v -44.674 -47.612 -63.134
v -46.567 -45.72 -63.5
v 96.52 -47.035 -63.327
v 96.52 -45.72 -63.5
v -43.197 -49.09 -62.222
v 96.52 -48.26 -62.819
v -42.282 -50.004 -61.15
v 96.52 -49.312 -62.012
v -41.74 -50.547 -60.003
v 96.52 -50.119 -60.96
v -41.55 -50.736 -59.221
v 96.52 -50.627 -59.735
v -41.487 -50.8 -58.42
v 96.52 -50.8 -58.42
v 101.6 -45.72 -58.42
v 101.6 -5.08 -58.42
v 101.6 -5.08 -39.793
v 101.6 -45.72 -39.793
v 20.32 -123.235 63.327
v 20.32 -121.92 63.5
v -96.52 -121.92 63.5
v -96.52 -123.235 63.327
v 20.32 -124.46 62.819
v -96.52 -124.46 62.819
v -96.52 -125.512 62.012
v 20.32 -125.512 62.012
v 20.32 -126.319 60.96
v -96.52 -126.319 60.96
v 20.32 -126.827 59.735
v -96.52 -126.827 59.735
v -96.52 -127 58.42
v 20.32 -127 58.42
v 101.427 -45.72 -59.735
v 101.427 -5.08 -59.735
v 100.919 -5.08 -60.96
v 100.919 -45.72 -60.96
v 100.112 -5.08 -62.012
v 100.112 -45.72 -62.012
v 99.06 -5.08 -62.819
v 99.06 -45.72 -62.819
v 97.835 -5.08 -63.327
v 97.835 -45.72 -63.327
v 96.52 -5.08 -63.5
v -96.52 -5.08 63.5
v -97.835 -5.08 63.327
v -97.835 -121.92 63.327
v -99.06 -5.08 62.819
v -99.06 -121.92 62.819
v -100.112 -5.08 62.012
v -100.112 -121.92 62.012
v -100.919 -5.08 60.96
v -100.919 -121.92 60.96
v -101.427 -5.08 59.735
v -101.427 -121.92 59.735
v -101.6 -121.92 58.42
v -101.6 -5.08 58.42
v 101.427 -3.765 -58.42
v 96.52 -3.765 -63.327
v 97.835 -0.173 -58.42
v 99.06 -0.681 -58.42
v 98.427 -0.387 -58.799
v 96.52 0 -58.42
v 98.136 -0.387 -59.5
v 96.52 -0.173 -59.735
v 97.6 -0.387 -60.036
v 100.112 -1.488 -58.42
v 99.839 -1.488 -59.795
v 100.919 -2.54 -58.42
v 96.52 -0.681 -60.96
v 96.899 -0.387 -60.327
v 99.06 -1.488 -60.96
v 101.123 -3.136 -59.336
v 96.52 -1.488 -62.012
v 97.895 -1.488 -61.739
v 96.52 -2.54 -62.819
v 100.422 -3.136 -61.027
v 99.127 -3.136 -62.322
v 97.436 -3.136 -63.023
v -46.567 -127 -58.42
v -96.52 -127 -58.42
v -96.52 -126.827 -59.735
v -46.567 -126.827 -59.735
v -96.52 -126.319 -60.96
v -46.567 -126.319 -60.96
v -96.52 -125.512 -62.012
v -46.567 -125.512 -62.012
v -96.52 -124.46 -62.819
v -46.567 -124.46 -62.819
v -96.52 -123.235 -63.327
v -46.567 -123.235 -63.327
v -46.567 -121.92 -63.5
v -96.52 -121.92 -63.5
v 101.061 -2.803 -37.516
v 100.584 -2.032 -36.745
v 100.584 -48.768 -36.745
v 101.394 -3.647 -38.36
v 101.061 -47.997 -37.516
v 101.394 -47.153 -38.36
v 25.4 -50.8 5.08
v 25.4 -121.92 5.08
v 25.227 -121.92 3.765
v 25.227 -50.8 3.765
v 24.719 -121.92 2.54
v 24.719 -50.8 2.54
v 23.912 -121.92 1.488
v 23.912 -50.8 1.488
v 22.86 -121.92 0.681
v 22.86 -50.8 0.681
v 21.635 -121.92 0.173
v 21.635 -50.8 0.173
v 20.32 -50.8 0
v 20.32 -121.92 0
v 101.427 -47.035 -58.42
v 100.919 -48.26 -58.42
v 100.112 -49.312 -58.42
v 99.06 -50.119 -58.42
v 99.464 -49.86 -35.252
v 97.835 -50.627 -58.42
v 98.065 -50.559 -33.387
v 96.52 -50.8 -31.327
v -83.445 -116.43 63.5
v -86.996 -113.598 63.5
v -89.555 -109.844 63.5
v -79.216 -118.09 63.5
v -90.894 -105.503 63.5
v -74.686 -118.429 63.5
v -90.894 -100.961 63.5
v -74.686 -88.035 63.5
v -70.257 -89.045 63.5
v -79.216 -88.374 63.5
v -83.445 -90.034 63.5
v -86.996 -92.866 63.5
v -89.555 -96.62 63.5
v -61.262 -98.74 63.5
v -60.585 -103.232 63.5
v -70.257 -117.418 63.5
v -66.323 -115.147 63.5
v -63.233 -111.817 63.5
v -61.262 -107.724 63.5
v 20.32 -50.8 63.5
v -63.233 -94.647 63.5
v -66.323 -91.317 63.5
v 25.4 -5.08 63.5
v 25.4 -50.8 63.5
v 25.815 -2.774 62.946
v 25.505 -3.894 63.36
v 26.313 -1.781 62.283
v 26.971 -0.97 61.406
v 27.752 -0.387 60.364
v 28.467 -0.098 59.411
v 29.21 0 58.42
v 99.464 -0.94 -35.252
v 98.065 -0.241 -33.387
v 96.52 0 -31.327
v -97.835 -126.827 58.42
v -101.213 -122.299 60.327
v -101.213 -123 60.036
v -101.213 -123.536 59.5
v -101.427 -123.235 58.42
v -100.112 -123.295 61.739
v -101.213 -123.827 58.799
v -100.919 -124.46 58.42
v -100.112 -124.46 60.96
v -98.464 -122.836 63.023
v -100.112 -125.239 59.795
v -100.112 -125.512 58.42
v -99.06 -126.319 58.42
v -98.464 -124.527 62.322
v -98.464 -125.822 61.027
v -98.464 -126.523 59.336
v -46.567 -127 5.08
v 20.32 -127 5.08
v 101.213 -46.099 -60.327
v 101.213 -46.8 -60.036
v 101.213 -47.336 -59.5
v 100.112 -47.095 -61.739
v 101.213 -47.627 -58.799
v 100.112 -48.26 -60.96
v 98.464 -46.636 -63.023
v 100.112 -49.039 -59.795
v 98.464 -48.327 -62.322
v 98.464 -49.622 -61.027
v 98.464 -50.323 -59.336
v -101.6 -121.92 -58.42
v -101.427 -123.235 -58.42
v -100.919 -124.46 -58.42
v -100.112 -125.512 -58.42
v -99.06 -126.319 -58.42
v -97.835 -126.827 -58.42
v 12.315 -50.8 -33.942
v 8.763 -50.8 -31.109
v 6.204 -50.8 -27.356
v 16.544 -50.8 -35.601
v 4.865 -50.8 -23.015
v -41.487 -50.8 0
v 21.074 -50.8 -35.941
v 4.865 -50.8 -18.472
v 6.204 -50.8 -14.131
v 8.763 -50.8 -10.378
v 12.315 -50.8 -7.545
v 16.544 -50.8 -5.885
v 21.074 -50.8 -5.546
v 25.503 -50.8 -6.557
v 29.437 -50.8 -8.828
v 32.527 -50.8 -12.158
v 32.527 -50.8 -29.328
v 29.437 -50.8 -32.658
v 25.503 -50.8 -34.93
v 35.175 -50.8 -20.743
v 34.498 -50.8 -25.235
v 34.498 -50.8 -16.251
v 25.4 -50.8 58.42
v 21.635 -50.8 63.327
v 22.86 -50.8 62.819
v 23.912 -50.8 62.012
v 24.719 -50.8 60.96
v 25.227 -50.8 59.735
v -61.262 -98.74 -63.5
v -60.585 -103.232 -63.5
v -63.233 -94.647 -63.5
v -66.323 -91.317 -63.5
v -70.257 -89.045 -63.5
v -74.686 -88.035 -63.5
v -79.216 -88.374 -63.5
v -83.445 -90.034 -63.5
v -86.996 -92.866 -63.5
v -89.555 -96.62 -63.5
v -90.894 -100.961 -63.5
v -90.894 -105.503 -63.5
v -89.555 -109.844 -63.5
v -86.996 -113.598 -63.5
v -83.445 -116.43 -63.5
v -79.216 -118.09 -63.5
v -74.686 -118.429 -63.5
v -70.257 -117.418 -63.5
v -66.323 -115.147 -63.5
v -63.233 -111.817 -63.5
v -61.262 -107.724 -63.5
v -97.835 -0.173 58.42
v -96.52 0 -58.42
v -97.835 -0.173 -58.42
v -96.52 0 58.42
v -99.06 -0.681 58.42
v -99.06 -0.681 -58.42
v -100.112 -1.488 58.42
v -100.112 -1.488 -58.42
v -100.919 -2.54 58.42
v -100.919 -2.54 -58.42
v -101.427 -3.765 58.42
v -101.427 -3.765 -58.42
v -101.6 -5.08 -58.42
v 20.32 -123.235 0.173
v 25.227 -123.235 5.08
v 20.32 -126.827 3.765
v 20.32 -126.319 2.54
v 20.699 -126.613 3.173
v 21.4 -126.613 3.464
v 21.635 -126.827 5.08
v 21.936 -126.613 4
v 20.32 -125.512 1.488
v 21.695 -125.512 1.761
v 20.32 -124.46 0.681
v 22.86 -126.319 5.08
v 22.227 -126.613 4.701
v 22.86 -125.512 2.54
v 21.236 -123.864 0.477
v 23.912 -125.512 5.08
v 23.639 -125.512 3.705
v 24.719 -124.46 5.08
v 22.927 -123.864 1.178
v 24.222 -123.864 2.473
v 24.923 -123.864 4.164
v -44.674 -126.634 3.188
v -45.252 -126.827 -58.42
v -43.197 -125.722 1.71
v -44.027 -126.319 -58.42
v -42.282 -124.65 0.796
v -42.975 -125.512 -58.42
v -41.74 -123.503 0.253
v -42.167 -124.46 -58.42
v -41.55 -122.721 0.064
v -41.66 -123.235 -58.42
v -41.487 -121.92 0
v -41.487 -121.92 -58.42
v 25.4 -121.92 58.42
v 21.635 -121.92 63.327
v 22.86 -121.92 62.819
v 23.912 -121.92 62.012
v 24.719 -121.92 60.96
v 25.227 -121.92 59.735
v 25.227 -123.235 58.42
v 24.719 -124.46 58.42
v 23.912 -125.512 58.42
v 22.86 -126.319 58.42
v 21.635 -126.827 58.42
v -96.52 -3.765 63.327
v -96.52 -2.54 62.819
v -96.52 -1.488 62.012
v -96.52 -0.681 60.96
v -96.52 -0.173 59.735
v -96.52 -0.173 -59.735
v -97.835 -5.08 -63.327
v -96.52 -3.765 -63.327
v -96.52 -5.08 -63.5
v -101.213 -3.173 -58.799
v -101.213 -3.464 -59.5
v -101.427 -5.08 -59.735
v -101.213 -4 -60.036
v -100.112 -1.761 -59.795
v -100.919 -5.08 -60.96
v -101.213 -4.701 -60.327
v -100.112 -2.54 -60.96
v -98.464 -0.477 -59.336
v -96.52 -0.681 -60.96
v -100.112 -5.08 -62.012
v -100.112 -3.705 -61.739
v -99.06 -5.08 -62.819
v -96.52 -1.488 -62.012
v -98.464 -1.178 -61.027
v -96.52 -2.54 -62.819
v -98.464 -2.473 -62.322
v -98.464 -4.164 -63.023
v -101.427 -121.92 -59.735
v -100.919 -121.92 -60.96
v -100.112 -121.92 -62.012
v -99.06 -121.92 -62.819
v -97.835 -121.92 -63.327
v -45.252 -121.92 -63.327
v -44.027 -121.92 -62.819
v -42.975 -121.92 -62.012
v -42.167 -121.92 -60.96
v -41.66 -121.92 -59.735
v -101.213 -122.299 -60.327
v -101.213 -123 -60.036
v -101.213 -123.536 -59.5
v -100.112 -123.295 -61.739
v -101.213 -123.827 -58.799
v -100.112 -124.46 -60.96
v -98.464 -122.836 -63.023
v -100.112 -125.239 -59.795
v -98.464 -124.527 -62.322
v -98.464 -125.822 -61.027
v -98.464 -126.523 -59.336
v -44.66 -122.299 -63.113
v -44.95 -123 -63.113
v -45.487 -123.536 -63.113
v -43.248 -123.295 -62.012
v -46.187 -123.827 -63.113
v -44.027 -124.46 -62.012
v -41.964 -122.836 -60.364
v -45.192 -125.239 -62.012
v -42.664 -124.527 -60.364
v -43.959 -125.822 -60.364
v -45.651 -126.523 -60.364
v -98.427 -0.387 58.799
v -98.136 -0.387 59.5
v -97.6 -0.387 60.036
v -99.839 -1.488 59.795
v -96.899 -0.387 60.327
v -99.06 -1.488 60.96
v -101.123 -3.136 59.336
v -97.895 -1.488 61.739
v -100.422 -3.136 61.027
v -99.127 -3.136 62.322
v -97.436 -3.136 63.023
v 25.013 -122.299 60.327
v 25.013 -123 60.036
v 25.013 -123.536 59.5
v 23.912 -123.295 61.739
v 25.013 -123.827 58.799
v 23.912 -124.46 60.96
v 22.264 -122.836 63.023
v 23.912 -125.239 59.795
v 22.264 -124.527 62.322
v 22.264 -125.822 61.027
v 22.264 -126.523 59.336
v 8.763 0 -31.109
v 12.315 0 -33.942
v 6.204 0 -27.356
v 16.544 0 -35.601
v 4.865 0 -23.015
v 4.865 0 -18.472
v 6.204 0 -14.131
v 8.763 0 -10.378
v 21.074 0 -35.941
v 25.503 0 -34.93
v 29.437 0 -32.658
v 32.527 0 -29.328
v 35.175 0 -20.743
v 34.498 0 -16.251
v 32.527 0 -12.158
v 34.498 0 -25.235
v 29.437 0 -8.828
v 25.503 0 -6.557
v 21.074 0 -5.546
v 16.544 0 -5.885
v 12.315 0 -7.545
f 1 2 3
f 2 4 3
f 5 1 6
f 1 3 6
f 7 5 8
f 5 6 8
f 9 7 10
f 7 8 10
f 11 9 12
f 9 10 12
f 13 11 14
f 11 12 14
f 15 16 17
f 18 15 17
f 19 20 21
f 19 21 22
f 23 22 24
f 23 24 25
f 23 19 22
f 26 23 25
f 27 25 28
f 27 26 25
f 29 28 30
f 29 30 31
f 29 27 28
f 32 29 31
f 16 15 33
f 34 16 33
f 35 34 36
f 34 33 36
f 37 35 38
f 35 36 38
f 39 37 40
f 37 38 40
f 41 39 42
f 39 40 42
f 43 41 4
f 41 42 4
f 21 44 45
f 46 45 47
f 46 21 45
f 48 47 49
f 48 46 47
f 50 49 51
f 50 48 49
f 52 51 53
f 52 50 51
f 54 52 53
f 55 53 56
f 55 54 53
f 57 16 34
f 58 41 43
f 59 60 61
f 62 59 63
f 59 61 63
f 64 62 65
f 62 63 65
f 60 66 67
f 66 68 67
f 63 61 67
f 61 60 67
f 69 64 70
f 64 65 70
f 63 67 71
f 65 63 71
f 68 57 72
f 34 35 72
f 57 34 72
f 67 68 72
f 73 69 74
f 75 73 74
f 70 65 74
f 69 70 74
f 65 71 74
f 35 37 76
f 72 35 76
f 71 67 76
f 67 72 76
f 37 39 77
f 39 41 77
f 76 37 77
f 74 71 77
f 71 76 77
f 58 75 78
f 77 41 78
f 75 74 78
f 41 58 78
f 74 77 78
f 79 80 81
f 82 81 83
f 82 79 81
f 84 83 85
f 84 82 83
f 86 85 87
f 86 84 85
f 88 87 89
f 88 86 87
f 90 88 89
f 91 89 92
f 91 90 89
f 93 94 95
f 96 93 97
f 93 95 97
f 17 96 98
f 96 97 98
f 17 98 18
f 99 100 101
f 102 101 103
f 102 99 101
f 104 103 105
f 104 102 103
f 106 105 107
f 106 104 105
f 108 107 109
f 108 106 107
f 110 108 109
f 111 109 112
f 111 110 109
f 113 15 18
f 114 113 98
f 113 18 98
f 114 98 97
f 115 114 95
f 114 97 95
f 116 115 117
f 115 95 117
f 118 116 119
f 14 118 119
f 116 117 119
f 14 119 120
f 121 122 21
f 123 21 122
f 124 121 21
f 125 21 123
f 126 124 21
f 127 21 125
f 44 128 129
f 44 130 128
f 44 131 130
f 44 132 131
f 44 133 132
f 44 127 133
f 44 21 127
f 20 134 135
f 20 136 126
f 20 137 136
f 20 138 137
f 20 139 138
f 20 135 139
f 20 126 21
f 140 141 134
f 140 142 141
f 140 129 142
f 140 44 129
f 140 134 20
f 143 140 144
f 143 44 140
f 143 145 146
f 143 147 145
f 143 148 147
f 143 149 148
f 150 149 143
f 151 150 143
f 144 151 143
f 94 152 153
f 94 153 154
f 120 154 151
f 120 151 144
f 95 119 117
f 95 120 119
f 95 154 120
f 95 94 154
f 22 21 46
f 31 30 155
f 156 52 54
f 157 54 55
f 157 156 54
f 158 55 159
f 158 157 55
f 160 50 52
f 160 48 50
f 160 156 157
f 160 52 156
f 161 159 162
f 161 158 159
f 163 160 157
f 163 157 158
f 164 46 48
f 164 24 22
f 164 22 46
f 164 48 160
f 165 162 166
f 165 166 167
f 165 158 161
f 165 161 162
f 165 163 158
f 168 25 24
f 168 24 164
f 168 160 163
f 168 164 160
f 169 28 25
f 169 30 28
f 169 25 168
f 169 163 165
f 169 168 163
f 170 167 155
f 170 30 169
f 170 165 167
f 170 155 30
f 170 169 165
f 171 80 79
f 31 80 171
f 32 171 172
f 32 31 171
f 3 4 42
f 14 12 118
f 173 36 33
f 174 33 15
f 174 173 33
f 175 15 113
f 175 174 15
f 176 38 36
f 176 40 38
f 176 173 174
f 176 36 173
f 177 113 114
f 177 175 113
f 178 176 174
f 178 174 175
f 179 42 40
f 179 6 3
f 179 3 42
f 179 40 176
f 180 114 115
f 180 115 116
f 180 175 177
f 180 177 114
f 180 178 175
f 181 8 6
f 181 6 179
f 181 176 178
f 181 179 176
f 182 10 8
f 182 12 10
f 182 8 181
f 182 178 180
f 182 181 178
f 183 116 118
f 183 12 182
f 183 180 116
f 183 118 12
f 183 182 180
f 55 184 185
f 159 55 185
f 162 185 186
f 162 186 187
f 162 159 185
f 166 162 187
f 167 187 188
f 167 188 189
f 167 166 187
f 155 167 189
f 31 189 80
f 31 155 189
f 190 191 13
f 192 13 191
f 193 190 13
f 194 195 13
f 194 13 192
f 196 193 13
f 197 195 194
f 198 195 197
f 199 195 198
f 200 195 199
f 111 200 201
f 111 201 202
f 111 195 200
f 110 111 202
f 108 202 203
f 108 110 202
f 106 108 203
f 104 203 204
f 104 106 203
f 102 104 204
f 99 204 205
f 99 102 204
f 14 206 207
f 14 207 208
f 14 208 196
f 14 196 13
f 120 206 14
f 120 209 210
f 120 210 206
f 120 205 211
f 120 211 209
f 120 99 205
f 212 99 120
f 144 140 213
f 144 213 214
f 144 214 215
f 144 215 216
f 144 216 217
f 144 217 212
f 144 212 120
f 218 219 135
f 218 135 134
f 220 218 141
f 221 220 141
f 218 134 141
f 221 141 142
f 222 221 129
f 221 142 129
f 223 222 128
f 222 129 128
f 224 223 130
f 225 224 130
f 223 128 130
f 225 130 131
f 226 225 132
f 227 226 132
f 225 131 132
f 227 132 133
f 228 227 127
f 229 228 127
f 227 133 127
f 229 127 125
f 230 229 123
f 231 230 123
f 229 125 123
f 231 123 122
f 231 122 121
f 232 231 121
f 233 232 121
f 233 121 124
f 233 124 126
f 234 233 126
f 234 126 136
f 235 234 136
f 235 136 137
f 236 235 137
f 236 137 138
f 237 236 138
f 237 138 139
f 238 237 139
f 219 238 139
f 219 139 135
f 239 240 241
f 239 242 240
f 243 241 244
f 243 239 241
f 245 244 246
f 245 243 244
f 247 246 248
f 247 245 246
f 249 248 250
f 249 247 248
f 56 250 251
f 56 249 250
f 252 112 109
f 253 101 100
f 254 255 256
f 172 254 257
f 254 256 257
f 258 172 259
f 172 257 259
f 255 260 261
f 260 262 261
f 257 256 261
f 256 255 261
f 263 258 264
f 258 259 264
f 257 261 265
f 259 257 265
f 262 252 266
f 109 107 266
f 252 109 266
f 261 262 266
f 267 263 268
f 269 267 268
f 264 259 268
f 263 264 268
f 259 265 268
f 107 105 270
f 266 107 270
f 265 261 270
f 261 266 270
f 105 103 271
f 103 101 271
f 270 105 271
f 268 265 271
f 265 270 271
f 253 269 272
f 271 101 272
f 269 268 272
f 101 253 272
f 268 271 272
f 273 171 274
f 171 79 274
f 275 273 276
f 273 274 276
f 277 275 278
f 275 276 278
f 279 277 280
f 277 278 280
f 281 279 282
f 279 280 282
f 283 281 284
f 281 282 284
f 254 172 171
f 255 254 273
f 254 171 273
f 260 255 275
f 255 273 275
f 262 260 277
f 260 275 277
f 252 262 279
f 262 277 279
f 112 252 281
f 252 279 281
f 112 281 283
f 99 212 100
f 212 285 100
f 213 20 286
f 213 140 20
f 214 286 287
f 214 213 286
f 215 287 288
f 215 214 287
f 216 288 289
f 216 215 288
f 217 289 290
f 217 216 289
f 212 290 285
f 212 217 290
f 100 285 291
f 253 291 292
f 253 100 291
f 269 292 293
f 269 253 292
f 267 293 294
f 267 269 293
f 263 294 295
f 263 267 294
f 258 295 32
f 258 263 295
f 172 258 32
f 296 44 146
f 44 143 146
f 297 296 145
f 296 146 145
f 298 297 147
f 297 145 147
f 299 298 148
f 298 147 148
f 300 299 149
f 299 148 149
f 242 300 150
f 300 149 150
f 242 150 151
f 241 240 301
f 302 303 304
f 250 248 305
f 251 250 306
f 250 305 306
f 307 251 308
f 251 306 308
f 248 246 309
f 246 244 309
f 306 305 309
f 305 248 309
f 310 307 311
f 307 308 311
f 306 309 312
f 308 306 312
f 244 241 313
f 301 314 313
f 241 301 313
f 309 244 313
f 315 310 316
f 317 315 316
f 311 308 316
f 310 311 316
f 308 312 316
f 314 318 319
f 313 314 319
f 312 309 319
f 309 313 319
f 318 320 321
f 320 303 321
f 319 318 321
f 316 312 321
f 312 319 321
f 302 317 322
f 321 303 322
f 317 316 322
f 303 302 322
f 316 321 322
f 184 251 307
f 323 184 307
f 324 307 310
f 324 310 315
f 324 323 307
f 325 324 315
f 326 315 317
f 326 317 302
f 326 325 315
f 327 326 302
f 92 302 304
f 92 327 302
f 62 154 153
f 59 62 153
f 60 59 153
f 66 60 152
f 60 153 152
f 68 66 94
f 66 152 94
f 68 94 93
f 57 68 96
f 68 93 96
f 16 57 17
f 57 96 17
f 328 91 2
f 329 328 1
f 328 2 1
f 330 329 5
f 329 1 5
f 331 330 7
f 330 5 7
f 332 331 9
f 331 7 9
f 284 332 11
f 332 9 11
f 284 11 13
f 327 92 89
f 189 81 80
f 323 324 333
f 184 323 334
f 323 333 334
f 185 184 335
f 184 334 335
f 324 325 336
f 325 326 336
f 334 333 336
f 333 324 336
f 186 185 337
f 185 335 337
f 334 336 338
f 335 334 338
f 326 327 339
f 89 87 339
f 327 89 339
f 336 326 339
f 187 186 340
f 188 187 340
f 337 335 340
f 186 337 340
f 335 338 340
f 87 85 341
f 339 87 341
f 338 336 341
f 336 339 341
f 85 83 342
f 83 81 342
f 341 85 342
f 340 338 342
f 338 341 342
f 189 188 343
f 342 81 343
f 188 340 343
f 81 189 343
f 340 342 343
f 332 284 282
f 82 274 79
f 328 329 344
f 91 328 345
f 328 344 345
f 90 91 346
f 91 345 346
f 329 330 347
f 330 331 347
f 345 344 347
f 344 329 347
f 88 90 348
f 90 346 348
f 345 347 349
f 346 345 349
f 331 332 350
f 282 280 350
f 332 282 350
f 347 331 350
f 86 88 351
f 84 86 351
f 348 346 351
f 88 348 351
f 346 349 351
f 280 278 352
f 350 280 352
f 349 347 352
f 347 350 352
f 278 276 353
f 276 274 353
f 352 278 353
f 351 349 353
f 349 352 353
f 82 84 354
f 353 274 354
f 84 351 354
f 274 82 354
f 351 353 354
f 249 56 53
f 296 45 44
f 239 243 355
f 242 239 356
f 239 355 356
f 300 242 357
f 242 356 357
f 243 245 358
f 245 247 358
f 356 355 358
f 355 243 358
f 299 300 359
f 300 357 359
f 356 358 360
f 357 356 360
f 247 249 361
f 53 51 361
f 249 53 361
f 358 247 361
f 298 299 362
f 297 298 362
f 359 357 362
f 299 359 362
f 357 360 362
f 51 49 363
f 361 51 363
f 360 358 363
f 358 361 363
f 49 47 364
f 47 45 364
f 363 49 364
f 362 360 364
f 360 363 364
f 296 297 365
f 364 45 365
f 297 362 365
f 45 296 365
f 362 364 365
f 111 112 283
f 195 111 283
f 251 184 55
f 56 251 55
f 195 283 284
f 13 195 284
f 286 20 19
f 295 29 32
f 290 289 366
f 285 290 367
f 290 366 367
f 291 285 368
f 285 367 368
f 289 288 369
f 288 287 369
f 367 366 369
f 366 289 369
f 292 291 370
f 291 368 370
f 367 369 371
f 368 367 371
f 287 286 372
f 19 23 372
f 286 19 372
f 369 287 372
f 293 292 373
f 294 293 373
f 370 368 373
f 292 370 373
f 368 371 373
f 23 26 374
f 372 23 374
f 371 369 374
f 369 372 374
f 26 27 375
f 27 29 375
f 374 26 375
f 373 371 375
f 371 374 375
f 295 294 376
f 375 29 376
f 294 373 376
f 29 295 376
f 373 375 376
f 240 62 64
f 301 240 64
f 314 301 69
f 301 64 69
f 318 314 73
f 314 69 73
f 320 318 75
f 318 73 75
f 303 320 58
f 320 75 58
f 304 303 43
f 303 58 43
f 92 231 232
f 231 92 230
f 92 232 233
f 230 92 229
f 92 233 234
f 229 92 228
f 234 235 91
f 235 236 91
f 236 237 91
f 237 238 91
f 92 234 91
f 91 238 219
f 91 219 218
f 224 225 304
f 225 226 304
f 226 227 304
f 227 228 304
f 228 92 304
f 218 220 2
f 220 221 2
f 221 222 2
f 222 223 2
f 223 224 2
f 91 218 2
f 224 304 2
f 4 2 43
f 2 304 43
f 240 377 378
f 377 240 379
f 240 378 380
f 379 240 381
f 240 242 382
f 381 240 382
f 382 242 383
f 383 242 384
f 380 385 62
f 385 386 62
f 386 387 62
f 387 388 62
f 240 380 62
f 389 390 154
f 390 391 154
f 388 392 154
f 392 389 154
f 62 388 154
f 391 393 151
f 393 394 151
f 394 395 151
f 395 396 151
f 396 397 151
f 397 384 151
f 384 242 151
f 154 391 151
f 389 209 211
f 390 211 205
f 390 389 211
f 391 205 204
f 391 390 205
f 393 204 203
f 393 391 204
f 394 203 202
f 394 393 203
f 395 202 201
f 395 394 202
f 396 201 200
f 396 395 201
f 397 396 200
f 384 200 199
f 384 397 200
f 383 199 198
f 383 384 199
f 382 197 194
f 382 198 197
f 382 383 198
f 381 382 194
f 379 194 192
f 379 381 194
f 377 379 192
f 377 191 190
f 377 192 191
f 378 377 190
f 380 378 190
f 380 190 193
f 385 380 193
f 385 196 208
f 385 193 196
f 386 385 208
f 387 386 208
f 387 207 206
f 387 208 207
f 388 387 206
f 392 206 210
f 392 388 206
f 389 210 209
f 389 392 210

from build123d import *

# Parameters (mm, degrees)
F0_W          = 203.2
F0_H          = 127
F1_DEPTH      = 127
F3_DEPTH      = 76.2
F4_SIZE2      = 101.6
F4_SIZE       = 76.2
F5_R          = 5.08
F6_R          = 15.24
F7_DEPTH      = 25.4
F7_DEPTH_BACK = 76.2
F8_R          = 15.24
F9_DEPTH      = 254
F9_DEPTH_BACK = 254


with BuildPart() as f1:
    # F0 (on Front) → F1 (new body)
    with BuildSketch(Plane.XZ):
        Rectangle(F0_W, F0_H)
    extrude(amount=F1_DEPTH)

    # F2 (on face) → F3 (cut)
    with BuildSketch(Plane.XZ.offset(127)):
        Polygon((101.6, 63.5), (25.4, 63.5), (25.4, 0), (-41.4866656065, 0), (-41.4866656065, -63.5), (101.6, -63.5), align=None)
    extrude(amount=-F3_DEPTH, mode=Mode.SUBTRACT)

    # F4
    f4_edges = [f1.edges().sort_by_distance(p)[0] for p in [
        (101.6, -25.4, 63.5),
    ]]
    f4_side = f1.faces().sort_by_distance((-18.435484, -56.125806, 63.5))[0]
    chamfer(f4_edges, length=F4_SIZE, length2=F4_SIZE2, reference=f4_side)

    # F5
    f5_edges = [f1.edges().sort_by_distance(p)[0] for p in [
        (-38.1, -127, 63.5),
        (25.4, -88.9, 63.5),
        (25.4, -88.9, 0),
        (-8.043333, -127, 0),
        (-101.6, -63.5, 63.5),
        (-41.486666, -127, -31.75),
        (-41.486666, -88.9, -63.5),
        (-71.543333, -127, -63.5),
        (30.056667, -50.8, -63.5),
        (101.6, -25.4, -63.5),
        (101.6, -50.8, -50.8),
        (101.6, 0, -50.8),
        (101.6, -25.4, -38.1),
        (0, 0, -63.5),
        (-101.6, 0, 0),
        (-101.6, -63.5, -63.5),
        (25.4, -127, 31.75),
        (-101.6, -127, 0),
        (-38.1, 0, 63.5),
    ]]
    fillet(f5_edges, radius=F5_R)

    # F6 (on Front) → F7 (cut, two sides)
    with BuildSketch(Plane.XZ) as f7_sk:
        with Locations((19.9351496994, -20.7433328032)):
            Circle(F6_R)
    extrude(amount=-F7_DEPTH, mode=Mode.SUBTRACT)
    extrude(f7_sk.sketch, amount=F7_DEPTH_BACK, mode=Mode.SUBTRACT)

    # F8 (on face) → F9 (cut, two sides)
    with BuildSketch(Plane.XY.offset(63.5)) as f9_sk:
        with Locations((-75.8246555924, -103.2319366932)):
            Circle(F8_R)
    extrude(amount=-F9_DEPTH, mode=Mode.SUBTRACT)
    extrude(f9_sk.sketch, amount=F9_DEPTH_BACK, mode=Mode.SUBTRACT)


solid = f1.part
